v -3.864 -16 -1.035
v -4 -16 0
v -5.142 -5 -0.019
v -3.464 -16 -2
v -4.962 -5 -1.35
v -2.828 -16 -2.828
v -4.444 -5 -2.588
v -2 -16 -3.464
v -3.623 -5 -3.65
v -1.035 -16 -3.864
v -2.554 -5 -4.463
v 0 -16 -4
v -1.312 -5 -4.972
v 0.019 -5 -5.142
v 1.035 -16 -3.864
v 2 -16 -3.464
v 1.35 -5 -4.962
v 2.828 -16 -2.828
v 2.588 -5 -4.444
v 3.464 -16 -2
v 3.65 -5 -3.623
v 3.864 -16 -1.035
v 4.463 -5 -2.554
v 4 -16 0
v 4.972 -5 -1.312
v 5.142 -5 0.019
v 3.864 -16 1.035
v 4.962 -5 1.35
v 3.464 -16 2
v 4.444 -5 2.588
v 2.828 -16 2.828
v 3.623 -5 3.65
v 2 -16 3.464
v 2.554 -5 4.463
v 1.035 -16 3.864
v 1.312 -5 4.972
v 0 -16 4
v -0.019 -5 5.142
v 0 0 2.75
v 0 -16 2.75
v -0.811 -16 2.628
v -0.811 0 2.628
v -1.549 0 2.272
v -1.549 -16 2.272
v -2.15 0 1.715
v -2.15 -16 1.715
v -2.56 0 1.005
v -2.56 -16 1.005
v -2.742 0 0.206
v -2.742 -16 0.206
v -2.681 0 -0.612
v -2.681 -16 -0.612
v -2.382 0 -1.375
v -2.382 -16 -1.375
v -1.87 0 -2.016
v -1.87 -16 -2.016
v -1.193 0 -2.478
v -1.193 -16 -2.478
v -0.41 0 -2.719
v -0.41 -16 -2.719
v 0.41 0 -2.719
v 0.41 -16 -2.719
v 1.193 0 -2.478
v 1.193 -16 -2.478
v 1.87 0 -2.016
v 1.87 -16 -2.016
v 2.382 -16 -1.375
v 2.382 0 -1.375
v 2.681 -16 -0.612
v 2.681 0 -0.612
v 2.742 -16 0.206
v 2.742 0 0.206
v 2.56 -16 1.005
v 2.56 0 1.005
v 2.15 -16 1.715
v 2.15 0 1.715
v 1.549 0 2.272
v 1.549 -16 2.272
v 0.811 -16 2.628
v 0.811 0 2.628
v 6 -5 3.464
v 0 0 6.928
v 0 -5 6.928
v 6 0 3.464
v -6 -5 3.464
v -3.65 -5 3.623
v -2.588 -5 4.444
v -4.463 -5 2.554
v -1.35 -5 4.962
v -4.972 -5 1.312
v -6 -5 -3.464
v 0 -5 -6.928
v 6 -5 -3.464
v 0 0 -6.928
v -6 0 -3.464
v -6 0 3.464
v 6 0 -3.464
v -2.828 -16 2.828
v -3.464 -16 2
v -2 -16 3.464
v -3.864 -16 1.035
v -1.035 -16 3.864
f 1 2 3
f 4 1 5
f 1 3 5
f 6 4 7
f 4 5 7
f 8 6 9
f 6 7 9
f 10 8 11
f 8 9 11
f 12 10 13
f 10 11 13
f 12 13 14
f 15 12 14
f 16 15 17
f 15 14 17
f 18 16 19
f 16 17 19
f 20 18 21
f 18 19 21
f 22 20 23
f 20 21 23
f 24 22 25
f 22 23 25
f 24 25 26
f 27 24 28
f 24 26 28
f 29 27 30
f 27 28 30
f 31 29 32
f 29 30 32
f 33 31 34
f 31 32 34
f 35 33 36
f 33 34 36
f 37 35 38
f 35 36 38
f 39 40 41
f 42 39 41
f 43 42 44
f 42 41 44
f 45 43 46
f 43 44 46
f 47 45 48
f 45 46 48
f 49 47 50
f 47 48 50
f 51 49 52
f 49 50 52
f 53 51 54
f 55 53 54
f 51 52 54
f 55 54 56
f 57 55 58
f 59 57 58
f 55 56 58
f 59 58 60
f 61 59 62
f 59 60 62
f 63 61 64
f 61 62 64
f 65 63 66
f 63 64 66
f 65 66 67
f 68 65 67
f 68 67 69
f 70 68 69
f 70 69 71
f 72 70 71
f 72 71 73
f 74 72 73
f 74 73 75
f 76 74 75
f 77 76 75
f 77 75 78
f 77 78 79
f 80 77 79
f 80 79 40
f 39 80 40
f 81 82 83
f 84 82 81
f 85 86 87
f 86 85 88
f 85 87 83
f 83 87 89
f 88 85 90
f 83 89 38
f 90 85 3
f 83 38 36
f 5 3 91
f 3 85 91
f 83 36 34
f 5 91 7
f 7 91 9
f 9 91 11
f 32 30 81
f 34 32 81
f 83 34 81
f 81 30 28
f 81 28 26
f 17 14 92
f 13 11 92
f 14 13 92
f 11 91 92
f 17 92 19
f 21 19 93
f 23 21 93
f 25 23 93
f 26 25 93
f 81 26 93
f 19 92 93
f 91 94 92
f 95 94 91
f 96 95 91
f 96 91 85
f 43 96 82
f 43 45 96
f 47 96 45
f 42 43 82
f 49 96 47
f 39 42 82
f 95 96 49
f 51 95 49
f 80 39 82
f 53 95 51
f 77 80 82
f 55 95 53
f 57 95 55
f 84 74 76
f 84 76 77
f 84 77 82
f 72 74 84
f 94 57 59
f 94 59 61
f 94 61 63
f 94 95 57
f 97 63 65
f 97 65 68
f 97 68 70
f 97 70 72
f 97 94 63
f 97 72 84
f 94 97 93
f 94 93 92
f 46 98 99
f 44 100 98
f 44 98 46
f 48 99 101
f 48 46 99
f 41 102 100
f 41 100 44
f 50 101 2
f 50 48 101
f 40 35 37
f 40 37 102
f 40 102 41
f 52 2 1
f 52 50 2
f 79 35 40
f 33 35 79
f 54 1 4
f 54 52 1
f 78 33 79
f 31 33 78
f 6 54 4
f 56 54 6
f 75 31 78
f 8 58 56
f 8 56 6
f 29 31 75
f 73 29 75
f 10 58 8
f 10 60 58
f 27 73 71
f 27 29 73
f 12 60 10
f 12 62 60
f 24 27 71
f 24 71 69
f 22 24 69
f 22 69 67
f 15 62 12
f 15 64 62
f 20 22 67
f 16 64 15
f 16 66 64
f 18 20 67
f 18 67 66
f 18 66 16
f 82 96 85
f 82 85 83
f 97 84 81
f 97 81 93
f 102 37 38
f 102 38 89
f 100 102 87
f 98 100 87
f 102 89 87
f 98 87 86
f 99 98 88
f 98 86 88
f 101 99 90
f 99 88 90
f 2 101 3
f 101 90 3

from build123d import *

# Parameters (mm, degrees)
RESSALTO_EXTRUS_O1_DEPTH = 5
ESBO_O2_R                = 4
RESSALTO_EXTRUS_O2_DEPTH = 11
ESBO_O3_R                = 2.75
CORTE_EXTRUS_O1_DEPTH    = 22


with BuildPart() as part:
    # Esboço1 → Ressalto-extrusão1 (new body)
    with BuildSketch(Plane(origin=(0, 0, 0), x_dir=(1, 0, 0), z_dir=(0, 1, 0))):
        Polygon((0, -6.92820323), (6, -3.464101615), (6, 3.464101615), (0, 6.92820323), (-6, 3.464101615), (-6, -3.464101615), align=None)
    extrude(amount=-RESSALTO_EXTRUS_O1_DEPTH)


with BuildPart() as body_2:
    # Esboço2 → Ressalto-extrusão2 (new body)
    with BuildSketch(Plane.XZ.offset(5)):
        with Locations(Location((0, 0, 0), (0, 0, 270))):
            Circle(ESBO_O2_R)
    extrude(amount=RESSALTO_EXTRUS_O2_DEPTH)


with BuildPart() as corte_extrus_o1_tool:
    # Esboço3 → Corte-extrusão1 (new body)
    with BuildSketch(Plane.XZ.offset(16)):
        with Locations(Location((0, 0, 0), (0, 0, 90))):
            Circle(ESBO_O3_R)
    extrude(amount=-CORTE_EXTRUS_O1_DEPTH)


with BuildPart() as part_1:
    add(part.part)

    # Corte-extrusão1: cut by corte_extrus_o1_tool
    add(corte_extrus_o1_tool.part, mode=Mode.SUBTRACT)



with BuildPart() as body_2_1:
    add(body_2.part)

    # Corte-extrusão1: cut by corte_extrus_o1_tool
    add(corte_extrus_o1_tool.part, mode=Mode.SUBTRACT)


with BuildPart() as part_2:
    add(part_1.part)

    add(body_2_1.part)  # Varredura1 merges body 2
    # Varredura1: sweep along a curve in space
    with BuildLine() as varredura1_path:
        ThreePointArc((0, -16, -4), (2.828427125, -16, -2.828427125), (4, -16, 0))
        ThreePointArc((4, -16, 0), (2.828427125, -16, 2.828427125), (0, -16, 4))
        ThreePointArc((0, -16, 4), (-2.828427125, -16, 2.828427125), (-4, -16, 0))
        ThreePointArc((-4, -16, 0), (-2.828427125, -16, -2.828427125), (0, -16, -4))
    # 3DSketch3 → Varredura1 (sweep)
    with BuildSketch(Plane(origin=(3.994740422, -5, -0.205058439), x_dir=(0.00013207405092369588, -0.999996124817467, 0.0027808104024168727), z_dir=(0, 0.0027808104266704827, 0.9999961335392108))):
        Polygon((0, 0), (0.000151027, 1.14349999), (11.000042627, 0), align=None)
    sweep(path=varredura1_path.line)


solid = part_2.part
